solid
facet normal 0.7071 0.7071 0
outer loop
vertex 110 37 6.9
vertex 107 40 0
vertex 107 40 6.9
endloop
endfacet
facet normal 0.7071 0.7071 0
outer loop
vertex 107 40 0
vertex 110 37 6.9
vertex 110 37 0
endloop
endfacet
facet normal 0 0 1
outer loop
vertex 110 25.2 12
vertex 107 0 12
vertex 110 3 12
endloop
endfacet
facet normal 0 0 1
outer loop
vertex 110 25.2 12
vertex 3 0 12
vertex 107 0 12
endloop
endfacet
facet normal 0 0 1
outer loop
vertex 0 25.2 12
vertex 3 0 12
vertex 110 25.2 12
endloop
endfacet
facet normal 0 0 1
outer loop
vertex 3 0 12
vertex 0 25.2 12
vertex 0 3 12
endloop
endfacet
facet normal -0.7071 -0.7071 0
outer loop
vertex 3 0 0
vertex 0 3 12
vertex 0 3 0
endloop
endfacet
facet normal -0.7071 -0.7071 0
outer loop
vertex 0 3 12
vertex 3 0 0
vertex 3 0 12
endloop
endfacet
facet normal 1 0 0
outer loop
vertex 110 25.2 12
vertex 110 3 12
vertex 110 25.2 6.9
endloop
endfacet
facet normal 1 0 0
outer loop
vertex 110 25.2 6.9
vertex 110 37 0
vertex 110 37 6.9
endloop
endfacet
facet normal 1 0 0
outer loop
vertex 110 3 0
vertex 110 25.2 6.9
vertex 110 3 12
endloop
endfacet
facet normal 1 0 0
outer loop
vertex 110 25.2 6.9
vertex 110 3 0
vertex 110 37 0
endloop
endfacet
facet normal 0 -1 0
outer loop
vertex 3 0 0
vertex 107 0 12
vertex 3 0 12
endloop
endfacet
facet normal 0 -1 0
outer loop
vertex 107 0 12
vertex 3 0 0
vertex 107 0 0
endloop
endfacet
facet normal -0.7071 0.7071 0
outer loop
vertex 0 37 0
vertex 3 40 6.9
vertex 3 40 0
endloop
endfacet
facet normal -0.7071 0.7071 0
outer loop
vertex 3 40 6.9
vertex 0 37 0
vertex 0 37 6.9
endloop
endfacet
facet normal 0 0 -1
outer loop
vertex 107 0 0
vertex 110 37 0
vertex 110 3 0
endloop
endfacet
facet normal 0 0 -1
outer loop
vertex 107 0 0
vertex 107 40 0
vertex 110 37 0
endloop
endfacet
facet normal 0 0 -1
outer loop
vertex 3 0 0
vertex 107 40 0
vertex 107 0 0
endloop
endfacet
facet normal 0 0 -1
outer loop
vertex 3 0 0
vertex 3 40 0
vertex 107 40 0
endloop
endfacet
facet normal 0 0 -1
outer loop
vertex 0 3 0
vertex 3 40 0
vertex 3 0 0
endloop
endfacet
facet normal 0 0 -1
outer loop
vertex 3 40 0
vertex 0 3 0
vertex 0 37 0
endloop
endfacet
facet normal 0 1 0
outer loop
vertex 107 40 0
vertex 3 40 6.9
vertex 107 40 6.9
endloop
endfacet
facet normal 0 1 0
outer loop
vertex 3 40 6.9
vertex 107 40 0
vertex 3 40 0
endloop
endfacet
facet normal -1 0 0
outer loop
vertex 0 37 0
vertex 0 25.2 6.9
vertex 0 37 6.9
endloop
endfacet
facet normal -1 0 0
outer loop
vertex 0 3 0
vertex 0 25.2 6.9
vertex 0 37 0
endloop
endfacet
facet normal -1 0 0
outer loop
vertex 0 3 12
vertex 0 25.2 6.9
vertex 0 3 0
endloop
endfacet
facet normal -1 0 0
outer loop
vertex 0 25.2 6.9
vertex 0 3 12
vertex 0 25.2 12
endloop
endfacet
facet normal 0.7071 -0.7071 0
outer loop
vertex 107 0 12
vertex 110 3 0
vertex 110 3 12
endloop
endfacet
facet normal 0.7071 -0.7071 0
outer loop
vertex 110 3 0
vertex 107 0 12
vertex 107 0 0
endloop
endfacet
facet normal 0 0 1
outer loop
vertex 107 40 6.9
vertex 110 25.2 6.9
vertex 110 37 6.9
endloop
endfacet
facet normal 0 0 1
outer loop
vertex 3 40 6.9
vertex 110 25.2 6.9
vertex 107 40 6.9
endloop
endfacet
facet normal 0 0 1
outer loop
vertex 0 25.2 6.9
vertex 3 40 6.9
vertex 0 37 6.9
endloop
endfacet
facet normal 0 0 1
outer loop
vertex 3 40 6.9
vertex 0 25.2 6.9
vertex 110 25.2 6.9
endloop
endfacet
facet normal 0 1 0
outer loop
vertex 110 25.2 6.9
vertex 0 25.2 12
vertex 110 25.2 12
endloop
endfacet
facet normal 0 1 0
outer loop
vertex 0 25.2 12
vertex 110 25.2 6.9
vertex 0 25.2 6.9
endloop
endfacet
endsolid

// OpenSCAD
$fn = 32;

// ----------------------------------------------------------------------
// Stepped bar: sidestep, 110 x 40 x 12/6.9 mm
// ----------------------------------------------------------------------

// --- parameters (mm) ---
bar_l = 110;              // bar length, X
bar_w = 40;               // bar width, Y
plate_t = 12;             // thickness of the thick zone, Z
thin_t = 6.9;             // thickness of the thin zone
corner_c = 3;             // corner chamfer of the bar
step_cut = 5.1;           // material removed from the thin zone
ledge_y = 25.2;           // start of the ledge from the front edge
depth_1 = 5.1;            // depth of cut 1 from the top face

profile = [[3, 0], [107, 0], [110, 3], [110, 37], [107, 40], [3, 40], [0, 37], [0, 3]];  // primary outline, 8 points, counter clockwise
void_1 = [[-1, 25.2], [111, 25.2], [111, 41], [-1, 41]];  // ledge cut along one edge, 4 points

// --- the one profile operation ---
difference() {
  linear_extrude(height = plate_t) polygon(points = profile);
  translate([0, 0, plate_t - depth_1])
    linear_extrude(height = depth_1 + 1) polygon(points = void_1);
}
